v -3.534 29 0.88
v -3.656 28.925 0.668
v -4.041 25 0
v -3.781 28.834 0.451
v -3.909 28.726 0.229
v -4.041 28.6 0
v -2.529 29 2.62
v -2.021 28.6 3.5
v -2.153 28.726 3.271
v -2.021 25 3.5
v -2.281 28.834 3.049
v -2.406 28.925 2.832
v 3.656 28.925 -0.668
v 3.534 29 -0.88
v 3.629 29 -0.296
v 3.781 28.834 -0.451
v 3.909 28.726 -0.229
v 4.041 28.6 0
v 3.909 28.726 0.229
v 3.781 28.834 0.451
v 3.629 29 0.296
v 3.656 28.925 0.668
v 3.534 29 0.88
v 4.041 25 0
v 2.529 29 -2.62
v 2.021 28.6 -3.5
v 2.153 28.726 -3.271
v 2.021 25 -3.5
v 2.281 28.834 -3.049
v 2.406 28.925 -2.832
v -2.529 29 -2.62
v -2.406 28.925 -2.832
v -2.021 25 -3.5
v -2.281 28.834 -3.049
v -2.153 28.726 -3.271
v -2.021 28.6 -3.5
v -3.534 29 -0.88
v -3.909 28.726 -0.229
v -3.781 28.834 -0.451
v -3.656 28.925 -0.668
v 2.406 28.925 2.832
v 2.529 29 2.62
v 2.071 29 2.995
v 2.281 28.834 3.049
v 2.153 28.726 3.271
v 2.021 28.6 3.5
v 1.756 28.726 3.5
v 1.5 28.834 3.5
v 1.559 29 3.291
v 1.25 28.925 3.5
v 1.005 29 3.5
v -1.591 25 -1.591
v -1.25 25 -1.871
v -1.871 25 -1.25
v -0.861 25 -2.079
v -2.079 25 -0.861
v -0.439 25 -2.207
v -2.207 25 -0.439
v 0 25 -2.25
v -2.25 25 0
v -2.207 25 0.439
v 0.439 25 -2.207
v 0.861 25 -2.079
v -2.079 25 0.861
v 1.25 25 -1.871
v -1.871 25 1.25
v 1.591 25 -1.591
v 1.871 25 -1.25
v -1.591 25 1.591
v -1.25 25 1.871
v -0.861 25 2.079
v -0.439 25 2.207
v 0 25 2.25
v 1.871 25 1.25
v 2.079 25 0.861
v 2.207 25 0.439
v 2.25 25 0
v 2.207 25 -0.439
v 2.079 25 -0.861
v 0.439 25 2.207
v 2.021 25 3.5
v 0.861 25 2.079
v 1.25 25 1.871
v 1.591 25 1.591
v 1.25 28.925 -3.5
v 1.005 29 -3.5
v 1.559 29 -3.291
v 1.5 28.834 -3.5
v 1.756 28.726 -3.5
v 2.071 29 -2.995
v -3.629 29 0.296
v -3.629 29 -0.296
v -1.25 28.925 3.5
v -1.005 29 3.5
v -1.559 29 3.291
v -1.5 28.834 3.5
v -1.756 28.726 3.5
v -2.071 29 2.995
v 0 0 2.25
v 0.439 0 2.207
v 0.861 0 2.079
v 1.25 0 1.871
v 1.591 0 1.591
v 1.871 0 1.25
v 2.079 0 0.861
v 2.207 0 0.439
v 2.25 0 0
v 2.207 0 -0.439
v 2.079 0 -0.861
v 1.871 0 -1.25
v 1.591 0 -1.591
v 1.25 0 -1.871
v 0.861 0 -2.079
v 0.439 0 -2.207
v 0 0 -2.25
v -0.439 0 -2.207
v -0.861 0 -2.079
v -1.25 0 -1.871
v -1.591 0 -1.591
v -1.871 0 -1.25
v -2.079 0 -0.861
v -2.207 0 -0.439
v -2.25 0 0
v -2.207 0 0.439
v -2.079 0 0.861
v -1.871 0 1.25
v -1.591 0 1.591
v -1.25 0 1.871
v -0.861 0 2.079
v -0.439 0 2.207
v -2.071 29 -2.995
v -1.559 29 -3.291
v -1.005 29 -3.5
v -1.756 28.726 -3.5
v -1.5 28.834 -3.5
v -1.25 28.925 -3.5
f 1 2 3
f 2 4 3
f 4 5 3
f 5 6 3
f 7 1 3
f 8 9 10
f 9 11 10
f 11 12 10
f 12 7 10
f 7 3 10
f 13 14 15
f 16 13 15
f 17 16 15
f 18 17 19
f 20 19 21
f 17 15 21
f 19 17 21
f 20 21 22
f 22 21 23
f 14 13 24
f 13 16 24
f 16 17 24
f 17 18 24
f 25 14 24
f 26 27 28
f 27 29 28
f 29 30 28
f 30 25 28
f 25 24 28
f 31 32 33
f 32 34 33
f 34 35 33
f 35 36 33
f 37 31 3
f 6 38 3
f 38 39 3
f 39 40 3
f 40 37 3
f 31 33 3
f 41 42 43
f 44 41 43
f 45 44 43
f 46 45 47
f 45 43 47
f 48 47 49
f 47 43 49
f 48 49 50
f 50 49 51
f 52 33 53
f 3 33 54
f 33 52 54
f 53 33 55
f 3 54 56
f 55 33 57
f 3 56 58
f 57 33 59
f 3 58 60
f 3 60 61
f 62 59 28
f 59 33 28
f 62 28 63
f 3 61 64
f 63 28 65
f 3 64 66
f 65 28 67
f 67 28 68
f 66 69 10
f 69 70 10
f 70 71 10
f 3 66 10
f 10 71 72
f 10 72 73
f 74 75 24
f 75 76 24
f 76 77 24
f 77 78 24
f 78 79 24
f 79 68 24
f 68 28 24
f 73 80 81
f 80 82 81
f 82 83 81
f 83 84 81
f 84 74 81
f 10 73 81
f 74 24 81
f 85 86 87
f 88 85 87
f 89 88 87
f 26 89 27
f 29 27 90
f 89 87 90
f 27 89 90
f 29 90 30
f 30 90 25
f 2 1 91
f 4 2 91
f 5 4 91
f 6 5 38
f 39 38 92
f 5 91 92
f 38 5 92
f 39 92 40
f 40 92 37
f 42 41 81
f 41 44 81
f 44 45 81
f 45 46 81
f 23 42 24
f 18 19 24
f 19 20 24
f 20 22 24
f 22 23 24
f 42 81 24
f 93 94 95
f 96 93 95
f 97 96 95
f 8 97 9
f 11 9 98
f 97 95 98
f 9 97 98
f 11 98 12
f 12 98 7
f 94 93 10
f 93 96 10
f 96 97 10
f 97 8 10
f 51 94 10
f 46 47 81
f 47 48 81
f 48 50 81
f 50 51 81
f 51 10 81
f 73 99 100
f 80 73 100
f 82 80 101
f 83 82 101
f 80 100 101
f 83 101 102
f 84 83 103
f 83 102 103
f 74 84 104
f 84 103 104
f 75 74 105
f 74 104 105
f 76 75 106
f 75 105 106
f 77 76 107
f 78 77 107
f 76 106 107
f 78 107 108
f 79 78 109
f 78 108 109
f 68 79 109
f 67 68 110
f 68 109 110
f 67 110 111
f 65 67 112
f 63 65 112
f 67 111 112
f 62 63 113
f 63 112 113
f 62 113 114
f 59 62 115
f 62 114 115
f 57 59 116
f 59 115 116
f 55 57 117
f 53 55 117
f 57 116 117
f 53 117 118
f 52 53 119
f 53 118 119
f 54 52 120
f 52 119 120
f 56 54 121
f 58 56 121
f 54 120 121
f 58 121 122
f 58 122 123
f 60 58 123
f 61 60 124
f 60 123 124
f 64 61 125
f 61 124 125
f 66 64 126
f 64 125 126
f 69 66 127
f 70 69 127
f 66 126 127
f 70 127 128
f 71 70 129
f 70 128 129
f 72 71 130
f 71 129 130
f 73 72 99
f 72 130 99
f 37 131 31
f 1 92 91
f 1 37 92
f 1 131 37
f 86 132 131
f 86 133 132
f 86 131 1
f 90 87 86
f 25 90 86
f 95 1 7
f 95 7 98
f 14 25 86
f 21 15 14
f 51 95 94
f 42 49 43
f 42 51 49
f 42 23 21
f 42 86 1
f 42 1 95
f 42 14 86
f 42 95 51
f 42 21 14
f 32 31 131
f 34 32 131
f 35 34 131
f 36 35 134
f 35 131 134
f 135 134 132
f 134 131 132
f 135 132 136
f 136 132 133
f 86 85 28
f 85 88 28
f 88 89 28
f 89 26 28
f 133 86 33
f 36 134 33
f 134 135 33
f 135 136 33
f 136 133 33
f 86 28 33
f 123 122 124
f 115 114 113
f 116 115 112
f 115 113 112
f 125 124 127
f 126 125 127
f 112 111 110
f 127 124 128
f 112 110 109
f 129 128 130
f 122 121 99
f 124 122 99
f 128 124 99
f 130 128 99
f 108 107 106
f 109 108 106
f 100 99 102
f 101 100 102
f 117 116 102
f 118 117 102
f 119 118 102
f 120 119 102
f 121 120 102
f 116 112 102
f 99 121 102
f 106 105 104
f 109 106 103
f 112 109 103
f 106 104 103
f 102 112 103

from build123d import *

# Parameters (mm, degrees)
SKETCH1_R           = 2.25
BOSS_EXTRUDE1_DEPTH = 25
SKETCH2_R           = 2.25
BOSS_EXTRUDE2_DEPTH = 4


with BuildPart() as part:
    # Sketch1 → Boss-Extrude1 (new body)
    with BuildSketch(Plane(origin=(0, 0, 0), x_dir=(1, 0, 0), z_dir=(0, 1, 0))):
        with Locations(Location((0, 0, 0), (0, 0, 270))):
            Circle(SKETCH1_R)
    extrude(amount=BOSS_EXTRUDE1_DEPTH)

    # Sketch2 → Boss-Extrude2 (add)
    with BuildSketch(Plane(origin=(0, 25, 0), x_dir=(1, 0, 0), z_dir=(0, 1, 0))):
        with Locations(Location((0, 0, 0), (0, 0, 270))):
            Circle(SKETCH2_R)
        Polygon((-4.041451884, 0), (4.041451884, 0), (2.020725942, 3.5), (-2.020725942, 3.5), align=None)
        Polygon((-2.020725942, -3.5), (2.020725942, -3.5), (4.041451884, 0), (-4.041451884, 0), align=None)
        with BuildLine():
            ThreePointArc((-2.25, 0), (0, -2.25), (2.25, 0))
            Line((2.25, 0), (-2.25, 0))
        make_face()
        with BuildLine():
            Line((-2.25, 0), (2.25, 0))
            ThreePointArc((2.25, 0), (0, 2.25), (-2.25, 0))
        make_face()
    extrude(amount=BOSS_EXTRUDE2_DEPTH)

    # Sketch5 → Cut-Revolve1 (revolve, cut)
    with BuildSketch(Plane.XY):
        Polygon((3.641451884, 29), (4.041451884, 29), (4.041451884, 28.6), align=None)
    revolve(axis=Axis((0, 29, 0), (0, -1, 0)), mode=Mode.SUBTRACT)


solid = part.part
